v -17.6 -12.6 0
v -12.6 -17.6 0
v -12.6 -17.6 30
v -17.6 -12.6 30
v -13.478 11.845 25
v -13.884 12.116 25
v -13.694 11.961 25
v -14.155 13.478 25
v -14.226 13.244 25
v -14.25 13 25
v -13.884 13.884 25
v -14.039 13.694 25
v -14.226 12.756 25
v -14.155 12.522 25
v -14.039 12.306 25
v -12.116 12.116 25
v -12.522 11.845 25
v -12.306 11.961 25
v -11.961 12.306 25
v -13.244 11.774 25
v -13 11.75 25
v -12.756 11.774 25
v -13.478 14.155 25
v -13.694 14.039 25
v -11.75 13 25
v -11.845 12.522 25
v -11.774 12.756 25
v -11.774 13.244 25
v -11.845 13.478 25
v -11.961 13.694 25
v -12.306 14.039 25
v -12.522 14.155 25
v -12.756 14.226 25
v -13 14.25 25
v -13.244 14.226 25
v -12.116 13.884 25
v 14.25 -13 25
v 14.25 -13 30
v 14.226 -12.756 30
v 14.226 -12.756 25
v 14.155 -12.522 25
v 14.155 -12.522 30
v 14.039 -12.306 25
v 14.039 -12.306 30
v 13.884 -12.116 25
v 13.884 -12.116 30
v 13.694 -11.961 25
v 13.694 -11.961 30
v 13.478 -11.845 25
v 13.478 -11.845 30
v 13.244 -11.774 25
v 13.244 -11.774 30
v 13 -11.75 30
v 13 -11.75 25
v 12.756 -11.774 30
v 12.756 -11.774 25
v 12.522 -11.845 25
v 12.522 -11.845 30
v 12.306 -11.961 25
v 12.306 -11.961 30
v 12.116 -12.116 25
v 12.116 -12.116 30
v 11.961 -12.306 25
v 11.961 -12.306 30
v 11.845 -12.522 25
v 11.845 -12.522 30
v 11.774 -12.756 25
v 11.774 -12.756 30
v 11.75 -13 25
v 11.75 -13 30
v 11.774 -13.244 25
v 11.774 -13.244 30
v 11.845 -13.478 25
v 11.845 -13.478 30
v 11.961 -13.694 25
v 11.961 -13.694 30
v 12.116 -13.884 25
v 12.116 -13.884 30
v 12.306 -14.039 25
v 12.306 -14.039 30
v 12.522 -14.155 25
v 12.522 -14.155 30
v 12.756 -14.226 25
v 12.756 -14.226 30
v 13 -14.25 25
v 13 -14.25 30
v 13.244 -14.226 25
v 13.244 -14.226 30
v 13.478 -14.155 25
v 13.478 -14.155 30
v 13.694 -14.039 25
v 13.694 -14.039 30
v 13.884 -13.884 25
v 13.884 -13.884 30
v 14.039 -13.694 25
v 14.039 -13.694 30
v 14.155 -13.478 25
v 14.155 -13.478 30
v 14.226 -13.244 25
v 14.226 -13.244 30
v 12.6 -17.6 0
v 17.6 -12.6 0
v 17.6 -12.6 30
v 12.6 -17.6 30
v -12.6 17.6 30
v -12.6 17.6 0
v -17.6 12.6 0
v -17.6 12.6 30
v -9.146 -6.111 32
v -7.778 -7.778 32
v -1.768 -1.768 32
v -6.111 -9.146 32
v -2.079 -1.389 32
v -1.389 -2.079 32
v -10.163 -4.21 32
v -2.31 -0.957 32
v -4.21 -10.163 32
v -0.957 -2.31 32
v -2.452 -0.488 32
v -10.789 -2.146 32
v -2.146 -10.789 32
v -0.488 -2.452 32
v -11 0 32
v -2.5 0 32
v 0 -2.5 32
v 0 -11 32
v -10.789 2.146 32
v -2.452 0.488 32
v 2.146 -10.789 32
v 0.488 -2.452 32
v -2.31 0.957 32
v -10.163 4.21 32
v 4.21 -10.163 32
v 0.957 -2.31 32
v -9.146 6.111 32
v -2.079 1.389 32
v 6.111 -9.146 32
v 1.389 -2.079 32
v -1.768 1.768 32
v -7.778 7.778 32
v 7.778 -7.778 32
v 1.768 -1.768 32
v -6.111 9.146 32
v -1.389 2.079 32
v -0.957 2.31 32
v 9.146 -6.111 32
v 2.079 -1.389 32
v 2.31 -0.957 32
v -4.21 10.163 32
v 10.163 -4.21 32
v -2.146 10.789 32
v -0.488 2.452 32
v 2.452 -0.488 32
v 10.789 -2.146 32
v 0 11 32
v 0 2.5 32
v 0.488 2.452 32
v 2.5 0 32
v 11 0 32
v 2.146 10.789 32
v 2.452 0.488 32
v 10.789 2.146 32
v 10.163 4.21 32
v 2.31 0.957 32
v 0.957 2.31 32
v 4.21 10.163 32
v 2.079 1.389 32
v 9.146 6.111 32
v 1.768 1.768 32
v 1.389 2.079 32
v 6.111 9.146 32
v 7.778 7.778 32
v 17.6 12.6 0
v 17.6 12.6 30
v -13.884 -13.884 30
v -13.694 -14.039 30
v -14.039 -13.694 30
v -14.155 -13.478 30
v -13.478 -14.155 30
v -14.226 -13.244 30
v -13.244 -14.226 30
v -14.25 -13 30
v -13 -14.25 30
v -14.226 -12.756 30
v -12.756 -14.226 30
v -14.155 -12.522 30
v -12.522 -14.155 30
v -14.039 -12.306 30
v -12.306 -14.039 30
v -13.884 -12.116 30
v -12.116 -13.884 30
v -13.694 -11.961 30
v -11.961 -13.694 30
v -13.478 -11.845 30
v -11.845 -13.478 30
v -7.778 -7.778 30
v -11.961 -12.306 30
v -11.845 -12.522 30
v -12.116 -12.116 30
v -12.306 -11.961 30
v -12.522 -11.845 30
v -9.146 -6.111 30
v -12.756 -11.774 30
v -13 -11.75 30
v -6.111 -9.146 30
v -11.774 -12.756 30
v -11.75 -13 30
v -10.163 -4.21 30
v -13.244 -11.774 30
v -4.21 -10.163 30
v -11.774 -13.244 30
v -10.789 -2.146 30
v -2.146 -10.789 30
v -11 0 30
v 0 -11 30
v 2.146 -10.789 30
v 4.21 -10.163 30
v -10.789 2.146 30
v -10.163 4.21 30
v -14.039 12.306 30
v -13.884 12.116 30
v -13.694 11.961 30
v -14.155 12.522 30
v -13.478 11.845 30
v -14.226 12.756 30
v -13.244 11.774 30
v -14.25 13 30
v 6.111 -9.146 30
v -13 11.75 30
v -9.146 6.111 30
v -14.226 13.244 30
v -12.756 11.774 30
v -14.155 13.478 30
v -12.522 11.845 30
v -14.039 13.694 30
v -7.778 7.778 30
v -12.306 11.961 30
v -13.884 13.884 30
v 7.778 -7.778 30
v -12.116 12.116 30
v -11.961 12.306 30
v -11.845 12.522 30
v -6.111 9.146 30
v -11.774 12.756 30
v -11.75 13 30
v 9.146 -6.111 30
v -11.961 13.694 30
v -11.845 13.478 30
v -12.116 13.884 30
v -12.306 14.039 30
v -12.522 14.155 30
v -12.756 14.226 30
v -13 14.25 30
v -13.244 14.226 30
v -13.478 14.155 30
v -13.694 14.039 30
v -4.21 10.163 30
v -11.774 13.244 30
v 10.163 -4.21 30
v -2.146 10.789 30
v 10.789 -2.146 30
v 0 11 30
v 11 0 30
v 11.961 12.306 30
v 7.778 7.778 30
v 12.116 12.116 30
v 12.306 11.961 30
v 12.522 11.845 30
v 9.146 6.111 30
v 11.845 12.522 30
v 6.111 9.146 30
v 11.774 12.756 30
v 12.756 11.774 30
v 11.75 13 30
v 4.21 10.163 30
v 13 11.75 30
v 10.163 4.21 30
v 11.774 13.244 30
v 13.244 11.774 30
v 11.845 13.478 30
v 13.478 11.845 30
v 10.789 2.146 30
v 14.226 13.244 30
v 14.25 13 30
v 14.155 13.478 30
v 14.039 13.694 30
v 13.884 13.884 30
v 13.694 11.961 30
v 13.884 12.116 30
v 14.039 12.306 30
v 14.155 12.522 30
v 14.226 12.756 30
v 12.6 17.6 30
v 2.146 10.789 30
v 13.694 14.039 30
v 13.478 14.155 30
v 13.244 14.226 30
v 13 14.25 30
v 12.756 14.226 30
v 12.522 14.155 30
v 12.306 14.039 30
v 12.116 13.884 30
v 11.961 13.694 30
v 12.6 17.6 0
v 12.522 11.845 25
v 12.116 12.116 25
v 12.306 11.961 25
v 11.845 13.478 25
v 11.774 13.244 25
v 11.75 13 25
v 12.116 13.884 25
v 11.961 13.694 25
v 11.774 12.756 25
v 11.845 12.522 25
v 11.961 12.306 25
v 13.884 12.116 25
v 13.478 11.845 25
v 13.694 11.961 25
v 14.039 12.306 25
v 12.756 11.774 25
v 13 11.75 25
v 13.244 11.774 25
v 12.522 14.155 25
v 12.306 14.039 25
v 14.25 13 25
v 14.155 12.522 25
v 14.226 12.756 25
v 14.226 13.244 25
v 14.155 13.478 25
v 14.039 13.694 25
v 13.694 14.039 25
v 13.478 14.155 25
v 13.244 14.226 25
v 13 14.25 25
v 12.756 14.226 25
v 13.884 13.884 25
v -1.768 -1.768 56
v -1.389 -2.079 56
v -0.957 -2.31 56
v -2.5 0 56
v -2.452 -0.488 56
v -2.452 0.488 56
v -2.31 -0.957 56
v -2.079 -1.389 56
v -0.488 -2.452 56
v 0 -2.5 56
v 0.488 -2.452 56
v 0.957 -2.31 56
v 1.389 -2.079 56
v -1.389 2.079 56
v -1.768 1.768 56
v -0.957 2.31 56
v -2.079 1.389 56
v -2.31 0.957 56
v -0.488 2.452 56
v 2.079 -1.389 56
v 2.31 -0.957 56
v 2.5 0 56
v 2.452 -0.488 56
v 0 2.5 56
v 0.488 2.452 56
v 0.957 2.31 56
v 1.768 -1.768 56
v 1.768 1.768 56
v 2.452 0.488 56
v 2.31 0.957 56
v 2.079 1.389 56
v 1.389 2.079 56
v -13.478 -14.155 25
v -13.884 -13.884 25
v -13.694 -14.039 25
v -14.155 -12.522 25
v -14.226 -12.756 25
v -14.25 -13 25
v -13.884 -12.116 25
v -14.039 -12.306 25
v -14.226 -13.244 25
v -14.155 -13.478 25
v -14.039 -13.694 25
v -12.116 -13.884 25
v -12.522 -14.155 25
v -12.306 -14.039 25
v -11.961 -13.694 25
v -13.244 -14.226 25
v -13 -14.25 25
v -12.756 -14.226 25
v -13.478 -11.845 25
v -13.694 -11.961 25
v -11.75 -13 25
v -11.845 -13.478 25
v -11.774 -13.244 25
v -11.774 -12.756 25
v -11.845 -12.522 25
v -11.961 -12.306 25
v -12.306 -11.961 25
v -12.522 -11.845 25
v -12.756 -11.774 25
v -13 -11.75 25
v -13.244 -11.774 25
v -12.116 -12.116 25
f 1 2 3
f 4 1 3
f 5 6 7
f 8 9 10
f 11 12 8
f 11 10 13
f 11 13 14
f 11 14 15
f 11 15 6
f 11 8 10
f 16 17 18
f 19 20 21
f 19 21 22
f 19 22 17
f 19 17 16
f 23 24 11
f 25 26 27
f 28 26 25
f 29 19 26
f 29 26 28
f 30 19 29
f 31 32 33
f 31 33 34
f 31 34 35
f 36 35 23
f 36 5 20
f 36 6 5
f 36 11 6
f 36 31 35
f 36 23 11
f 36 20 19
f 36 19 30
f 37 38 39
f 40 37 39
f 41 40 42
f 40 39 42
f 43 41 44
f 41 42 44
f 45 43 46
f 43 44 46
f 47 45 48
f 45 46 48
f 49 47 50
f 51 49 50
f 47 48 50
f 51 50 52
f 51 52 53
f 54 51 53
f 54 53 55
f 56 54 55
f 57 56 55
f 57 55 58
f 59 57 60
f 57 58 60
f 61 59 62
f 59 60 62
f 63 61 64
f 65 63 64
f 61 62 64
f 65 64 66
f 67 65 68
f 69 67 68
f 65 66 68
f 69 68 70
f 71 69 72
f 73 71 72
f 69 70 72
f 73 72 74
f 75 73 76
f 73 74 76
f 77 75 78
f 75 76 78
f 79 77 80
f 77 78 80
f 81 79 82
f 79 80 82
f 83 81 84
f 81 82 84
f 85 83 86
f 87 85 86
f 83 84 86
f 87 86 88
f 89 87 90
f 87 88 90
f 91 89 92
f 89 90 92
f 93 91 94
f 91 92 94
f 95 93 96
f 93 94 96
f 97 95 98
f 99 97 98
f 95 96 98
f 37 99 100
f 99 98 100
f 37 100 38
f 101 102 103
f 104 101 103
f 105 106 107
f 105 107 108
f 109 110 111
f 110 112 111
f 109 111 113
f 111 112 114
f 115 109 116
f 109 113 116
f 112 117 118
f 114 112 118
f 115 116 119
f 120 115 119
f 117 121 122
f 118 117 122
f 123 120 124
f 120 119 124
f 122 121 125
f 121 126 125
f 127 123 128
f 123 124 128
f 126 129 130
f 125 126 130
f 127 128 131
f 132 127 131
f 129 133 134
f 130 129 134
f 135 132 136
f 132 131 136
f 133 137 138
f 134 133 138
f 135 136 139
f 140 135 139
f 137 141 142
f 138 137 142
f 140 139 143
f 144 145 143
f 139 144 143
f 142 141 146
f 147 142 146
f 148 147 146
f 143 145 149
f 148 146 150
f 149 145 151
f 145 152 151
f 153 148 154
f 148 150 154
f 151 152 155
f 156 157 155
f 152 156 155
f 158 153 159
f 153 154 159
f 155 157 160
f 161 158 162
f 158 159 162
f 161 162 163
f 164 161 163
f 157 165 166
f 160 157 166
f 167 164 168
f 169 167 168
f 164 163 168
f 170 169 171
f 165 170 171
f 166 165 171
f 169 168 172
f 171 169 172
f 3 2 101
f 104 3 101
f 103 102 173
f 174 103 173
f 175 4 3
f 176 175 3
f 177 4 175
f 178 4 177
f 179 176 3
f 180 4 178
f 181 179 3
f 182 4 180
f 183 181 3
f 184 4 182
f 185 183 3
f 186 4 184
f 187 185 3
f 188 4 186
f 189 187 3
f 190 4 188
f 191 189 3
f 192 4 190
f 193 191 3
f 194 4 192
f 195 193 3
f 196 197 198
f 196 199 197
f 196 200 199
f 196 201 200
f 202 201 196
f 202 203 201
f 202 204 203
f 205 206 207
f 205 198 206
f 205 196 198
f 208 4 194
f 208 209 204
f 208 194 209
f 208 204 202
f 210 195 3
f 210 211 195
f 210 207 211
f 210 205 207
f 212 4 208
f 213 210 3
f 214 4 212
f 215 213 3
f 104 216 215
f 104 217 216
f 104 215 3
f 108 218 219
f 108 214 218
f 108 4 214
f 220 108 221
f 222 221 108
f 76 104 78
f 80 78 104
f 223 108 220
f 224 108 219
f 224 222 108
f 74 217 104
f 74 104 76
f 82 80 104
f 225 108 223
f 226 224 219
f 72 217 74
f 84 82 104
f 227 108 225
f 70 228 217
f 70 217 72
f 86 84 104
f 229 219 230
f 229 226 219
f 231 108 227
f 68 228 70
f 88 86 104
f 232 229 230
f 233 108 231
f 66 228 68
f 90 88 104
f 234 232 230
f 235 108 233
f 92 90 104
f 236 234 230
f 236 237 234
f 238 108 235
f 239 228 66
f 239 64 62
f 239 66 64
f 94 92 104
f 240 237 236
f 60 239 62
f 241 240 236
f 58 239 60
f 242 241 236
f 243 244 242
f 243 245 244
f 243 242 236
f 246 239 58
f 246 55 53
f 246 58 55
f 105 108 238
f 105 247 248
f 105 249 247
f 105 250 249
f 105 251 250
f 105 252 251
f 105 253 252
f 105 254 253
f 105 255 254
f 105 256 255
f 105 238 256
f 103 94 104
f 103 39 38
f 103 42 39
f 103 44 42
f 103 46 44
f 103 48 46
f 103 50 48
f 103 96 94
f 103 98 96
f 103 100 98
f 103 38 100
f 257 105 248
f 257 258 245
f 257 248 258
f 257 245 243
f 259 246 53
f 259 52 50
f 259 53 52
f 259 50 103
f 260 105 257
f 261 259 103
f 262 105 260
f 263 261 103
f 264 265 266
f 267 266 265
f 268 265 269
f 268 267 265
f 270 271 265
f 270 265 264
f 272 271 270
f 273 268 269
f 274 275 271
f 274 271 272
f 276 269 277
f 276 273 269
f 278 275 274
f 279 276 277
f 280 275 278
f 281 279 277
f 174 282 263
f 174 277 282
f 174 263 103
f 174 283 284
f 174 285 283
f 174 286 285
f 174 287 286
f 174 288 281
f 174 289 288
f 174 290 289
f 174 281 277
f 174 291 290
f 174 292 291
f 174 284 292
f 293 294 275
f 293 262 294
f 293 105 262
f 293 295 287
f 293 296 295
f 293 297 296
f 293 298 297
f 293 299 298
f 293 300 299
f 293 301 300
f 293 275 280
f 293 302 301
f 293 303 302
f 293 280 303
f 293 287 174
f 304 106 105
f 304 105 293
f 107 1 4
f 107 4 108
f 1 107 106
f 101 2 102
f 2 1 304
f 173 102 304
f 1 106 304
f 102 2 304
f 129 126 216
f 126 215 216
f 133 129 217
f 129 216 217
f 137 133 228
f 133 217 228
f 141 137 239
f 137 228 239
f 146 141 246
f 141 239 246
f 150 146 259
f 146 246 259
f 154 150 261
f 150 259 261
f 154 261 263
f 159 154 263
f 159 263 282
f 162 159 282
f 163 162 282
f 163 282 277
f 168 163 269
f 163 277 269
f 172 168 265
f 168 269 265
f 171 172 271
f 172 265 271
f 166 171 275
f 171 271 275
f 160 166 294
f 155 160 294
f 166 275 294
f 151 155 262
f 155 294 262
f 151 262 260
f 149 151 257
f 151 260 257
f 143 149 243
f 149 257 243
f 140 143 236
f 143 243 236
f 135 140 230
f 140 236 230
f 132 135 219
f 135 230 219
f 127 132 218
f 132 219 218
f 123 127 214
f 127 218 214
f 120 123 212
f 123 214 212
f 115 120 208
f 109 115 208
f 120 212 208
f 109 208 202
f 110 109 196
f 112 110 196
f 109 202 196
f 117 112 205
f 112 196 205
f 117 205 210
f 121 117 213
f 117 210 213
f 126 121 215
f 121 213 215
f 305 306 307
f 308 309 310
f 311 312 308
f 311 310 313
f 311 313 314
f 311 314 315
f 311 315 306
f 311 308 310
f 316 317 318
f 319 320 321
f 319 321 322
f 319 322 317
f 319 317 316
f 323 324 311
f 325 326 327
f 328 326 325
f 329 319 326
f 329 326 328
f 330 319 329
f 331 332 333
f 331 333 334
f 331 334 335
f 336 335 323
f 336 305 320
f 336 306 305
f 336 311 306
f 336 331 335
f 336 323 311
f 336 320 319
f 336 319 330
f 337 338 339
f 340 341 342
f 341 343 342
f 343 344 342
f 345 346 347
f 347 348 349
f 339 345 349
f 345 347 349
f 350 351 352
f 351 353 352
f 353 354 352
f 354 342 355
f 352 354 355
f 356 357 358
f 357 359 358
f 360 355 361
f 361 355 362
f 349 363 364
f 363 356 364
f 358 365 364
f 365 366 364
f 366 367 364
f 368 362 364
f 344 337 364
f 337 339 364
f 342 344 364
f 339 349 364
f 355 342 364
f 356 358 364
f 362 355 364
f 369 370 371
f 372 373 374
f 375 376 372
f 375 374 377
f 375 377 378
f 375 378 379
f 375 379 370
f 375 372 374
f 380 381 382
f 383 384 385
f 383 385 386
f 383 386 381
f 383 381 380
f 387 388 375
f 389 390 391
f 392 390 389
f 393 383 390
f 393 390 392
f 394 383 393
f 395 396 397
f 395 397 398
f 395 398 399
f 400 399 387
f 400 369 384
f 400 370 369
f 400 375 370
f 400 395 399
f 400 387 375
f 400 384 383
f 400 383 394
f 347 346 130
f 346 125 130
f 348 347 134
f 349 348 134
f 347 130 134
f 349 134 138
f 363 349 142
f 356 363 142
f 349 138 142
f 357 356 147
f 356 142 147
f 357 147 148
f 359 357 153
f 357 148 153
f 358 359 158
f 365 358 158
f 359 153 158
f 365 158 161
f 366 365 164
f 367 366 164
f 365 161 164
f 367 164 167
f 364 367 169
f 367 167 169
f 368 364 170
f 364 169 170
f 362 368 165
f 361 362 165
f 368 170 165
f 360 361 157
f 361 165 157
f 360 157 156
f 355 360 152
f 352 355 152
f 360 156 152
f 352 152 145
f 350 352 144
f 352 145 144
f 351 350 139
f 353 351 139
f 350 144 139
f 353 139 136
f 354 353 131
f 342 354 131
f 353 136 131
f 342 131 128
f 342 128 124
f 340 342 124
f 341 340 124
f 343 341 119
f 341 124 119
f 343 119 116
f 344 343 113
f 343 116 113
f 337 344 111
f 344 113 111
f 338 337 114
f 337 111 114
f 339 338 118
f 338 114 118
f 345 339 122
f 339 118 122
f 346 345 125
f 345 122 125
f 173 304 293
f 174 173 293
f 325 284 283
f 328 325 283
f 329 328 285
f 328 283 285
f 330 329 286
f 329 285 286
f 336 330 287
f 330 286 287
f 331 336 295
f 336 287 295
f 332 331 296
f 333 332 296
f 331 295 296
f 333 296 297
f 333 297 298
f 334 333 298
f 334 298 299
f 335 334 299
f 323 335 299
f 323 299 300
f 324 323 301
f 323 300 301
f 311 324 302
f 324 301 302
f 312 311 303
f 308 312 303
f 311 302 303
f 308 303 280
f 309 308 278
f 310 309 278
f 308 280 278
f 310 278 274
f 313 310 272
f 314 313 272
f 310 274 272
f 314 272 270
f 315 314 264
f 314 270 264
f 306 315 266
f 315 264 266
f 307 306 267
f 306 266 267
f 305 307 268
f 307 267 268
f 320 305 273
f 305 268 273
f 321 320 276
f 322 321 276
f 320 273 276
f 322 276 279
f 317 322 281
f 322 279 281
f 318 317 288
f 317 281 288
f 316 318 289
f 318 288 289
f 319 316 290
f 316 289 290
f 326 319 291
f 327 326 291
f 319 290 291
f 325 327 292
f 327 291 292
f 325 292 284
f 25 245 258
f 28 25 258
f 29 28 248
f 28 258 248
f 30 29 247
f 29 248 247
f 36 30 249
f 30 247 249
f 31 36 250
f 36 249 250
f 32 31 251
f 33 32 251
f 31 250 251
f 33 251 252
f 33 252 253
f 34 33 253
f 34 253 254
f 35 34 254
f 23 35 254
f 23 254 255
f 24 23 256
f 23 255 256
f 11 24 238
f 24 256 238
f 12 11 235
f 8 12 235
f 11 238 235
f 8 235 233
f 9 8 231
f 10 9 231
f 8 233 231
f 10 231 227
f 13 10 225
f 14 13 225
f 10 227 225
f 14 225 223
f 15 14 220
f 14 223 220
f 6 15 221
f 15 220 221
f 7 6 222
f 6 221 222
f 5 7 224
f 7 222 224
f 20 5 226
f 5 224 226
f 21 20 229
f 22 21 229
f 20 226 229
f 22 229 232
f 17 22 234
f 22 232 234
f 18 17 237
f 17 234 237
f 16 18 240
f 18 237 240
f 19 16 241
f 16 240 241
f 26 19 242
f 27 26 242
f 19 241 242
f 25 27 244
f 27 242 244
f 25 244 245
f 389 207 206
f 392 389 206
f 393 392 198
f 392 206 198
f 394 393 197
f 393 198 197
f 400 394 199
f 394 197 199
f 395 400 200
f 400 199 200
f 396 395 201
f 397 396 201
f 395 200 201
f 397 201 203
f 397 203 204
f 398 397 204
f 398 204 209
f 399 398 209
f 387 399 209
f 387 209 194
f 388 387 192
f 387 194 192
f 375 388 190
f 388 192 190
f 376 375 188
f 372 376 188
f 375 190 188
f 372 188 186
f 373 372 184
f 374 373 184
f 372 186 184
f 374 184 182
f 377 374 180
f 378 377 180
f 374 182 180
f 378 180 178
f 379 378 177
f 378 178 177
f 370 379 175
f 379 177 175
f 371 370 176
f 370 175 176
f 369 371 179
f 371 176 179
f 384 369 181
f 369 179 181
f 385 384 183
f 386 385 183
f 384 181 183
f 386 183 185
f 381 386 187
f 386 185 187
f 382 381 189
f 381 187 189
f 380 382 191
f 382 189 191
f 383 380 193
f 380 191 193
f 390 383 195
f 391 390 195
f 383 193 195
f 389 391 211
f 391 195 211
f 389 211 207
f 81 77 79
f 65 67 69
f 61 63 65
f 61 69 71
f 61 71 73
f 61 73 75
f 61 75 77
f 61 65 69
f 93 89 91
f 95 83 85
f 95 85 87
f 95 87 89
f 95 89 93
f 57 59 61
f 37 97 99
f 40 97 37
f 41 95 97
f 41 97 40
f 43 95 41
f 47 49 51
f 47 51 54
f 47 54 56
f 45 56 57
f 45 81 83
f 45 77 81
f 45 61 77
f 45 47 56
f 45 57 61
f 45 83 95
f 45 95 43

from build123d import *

# Parameters (mm, degrees)
F0_W     = 35.2
F0_H     = 35.2
F1_DEPTH = 30
F2_SIZE  = 5
F5_R     = 1.25
F6_DEPTH = 5


with BuildPart() as f1:
    # F0 (on Top) → F1 (new body)
    with BuildSketch(Plane.XY):
        Rectangle(F0_W, F0_H)
    extrude(amount=F1_DEPTH)

    # F2
    f2_edges = [f1.edges().sort_by_distance(p)[0] for p in [
        (17.6, -17.6, 15),
        (-17.6, -17.6, 15),
        (-17.6, 17.6, 15),
        (17.6, 17.6, 15),
    ]]
    chamfer(f2_edges, length=F2_SIZE)

    # F3 (on Right) → F4 (revolve)
    with BuildSketch(Plane.YZ):
        Polygon((-11, 30), (0, 30), (0, 56), (-2.5, 56), (-2.5, 32), (-11, 32), align=None)
    revolve(axis=Axis((0, 0, 43), (0, 0, 1)))

    # F5 (on face) → F6 (cut)
    with BuildSketch(Plane.XY.offset(30)):
        with Locations((-13, 13)):
            Circle(F5_R)
        with Locations((13, 13)):
            Circle(F5_R)
        with Locations((13, -13)):
            Circle(F5_R)
        with Locations((-13, -13)):
            Circle(F5_R)
    extrude(amount=-F6_DEPTH, mode=Mode.SUBTRACT)


solid = f1.part
